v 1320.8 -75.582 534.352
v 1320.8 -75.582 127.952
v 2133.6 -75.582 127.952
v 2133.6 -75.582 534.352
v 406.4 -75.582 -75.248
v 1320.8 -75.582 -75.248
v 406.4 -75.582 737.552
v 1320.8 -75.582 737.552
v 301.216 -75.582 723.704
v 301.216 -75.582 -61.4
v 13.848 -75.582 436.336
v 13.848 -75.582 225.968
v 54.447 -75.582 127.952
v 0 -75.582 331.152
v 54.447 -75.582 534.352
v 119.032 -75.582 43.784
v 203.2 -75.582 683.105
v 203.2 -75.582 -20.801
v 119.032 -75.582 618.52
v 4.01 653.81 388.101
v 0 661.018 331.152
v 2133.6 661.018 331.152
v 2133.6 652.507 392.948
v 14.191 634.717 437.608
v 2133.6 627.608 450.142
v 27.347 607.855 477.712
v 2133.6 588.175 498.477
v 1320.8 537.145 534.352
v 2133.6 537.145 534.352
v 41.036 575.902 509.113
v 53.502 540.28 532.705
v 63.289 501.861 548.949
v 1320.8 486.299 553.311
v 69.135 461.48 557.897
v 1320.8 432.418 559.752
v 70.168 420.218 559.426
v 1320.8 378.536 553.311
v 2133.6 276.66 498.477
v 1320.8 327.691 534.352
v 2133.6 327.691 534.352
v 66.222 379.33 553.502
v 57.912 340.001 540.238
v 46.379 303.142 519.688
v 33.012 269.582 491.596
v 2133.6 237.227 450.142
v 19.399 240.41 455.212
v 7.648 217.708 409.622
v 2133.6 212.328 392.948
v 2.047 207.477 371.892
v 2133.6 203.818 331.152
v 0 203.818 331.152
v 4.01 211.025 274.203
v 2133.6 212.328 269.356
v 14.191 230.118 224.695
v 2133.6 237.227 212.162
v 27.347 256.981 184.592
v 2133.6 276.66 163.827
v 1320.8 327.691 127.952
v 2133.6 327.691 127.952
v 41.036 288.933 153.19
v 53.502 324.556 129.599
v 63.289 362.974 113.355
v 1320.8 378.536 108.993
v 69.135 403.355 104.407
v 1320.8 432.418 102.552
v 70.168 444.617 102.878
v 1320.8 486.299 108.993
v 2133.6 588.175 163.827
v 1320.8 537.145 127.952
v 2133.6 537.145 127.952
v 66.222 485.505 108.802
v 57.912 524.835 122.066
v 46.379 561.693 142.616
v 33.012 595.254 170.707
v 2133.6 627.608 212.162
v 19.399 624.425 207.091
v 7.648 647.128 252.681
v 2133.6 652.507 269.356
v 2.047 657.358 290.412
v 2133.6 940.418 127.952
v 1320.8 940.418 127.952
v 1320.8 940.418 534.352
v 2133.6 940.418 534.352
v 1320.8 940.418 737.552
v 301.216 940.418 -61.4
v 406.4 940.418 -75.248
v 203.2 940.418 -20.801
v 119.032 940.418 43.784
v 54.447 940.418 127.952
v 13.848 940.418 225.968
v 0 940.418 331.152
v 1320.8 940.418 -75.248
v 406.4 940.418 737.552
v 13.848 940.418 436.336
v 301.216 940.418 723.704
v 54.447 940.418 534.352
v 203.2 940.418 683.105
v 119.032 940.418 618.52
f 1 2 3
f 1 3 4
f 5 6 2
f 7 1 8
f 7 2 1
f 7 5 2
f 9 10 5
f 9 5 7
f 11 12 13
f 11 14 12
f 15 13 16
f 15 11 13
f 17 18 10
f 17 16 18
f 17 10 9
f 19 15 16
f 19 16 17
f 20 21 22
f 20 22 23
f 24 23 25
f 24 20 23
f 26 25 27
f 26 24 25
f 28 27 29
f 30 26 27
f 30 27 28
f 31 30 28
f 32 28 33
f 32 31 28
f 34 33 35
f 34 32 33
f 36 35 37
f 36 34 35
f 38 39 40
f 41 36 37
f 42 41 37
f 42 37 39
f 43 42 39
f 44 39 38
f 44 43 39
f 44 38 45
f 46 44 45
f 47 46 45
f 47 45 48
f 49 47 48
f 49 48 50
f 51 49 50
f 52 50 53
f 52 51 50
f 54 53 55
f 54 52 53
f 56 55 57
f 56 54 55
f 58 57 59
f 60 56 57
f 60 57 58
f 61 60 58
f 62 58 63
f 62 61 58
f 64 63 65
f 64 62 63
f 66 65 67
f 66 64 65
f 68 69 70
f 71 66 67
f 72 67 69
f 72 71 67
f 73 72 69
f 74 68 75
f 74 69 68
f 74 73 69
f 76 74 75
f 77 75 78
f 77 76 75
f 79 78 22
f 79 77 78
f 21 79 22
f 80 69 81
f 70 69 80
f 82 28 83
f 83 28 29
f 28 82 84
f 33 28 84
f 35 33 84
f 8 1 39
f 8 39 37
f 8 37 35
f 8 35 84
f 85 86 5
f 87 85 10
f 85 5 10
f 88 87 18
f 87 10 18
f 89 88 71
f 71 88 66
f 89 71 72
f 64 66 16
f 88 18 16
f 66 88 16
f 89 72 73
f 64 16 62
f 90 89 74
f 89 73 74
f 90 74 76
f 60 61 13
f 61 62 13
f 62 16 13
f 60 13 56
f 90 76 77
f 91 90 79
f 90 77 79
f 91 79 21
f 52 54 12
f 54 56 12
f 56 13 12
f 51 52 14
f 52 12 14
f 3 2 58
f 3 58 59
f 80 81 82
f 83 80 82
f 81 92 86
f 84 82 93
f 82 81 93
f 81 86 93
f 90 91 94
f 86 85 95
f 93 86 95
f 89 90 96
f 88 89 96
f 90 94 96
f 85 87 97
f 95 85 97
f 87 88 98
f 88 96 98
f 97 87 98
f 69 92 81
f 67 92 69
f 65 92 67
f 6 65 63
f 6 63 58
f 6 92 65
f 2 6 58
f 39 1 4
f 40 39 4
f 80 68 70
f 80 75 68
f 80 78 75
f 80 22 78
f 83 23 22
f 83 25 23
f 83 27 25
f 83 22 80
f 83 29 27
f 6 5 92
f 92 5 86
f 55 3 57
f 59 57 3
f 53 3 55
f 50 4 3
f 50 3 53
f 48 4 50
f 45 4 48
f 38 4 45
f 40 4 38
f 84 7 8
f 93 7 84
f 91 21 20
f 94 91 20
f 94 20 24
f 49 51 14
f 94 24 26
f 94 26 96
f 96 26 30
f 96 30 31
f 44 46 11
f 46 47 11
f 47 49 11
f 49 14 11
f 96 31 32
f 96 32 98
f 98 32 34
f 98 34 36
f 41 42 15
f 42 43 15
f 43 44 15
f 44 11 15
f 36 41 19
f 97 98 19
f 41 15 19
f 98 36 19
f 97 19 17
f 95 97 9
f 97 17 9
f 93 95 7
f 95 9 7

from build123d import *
from build123d import SkipClean  # not in build123d's __all__

# Parameters (mm, degrees)
F0_W     = 1016
F0_H     = 812.8
F0_R     = 228.6
F1_DEPTH = 2133.6
F2_W     = 812.8
F2_H     = 203.2
F3_DEPTH = 1016.001


with BuildPart() as f1:
    # F0 (on Right) → F1 (new body)
    with BuildSketch(Plane.YZ):
        with Locations((432.4176223874, 331.1518777847)):
            Rectangle(F0_W, F0_H)
        with Locations((432.4176223874, 331.1518777847)):
            Circle(F0_R, mode=Mode.SUBTRACT)
    extrude(amount=F1_DEPTH)

    # F2 (on face) → F3 (cut, through all)
    with BuildSketch(Plane.XZ.offset(75.5823776126)):
        with BuildLine():
            Line((0, 737.5518777847), (0, 331.1518777847))
            ThreePointArc((0, 331.1518777847), (119.0318041258, 618.5200736589), (406.4, 737.5518777847))
            Line((406.4, 737.5518777847), (0, 737.5518777847))
        make_face()
        with BuildLine():
            Line((0, 331.1518777847), (0, -75.2481222153))
            Line((0, -75.2481222153), (406.4, -75.2481222153))
            ThreePointArc((406.4, -75.2481222153), (119.0318041258, 43.7836819105), (0, 331.1518777847))
        make_face()
        with Locations((1727.2, 26.3518777847)):
            Rectangle(F2_W, F2_H)
        with Locations((1727.2, 635.9518777847)):
            Rectangle(F2_W, F2_H)
    with SkipClean():  # cleaning this boolean's faces spoils the solid; the shape is the same uncleaned
        extrude(amount=-F3_DEPTH, mode=Mode.SUBTRACT)


solid = f1.part
